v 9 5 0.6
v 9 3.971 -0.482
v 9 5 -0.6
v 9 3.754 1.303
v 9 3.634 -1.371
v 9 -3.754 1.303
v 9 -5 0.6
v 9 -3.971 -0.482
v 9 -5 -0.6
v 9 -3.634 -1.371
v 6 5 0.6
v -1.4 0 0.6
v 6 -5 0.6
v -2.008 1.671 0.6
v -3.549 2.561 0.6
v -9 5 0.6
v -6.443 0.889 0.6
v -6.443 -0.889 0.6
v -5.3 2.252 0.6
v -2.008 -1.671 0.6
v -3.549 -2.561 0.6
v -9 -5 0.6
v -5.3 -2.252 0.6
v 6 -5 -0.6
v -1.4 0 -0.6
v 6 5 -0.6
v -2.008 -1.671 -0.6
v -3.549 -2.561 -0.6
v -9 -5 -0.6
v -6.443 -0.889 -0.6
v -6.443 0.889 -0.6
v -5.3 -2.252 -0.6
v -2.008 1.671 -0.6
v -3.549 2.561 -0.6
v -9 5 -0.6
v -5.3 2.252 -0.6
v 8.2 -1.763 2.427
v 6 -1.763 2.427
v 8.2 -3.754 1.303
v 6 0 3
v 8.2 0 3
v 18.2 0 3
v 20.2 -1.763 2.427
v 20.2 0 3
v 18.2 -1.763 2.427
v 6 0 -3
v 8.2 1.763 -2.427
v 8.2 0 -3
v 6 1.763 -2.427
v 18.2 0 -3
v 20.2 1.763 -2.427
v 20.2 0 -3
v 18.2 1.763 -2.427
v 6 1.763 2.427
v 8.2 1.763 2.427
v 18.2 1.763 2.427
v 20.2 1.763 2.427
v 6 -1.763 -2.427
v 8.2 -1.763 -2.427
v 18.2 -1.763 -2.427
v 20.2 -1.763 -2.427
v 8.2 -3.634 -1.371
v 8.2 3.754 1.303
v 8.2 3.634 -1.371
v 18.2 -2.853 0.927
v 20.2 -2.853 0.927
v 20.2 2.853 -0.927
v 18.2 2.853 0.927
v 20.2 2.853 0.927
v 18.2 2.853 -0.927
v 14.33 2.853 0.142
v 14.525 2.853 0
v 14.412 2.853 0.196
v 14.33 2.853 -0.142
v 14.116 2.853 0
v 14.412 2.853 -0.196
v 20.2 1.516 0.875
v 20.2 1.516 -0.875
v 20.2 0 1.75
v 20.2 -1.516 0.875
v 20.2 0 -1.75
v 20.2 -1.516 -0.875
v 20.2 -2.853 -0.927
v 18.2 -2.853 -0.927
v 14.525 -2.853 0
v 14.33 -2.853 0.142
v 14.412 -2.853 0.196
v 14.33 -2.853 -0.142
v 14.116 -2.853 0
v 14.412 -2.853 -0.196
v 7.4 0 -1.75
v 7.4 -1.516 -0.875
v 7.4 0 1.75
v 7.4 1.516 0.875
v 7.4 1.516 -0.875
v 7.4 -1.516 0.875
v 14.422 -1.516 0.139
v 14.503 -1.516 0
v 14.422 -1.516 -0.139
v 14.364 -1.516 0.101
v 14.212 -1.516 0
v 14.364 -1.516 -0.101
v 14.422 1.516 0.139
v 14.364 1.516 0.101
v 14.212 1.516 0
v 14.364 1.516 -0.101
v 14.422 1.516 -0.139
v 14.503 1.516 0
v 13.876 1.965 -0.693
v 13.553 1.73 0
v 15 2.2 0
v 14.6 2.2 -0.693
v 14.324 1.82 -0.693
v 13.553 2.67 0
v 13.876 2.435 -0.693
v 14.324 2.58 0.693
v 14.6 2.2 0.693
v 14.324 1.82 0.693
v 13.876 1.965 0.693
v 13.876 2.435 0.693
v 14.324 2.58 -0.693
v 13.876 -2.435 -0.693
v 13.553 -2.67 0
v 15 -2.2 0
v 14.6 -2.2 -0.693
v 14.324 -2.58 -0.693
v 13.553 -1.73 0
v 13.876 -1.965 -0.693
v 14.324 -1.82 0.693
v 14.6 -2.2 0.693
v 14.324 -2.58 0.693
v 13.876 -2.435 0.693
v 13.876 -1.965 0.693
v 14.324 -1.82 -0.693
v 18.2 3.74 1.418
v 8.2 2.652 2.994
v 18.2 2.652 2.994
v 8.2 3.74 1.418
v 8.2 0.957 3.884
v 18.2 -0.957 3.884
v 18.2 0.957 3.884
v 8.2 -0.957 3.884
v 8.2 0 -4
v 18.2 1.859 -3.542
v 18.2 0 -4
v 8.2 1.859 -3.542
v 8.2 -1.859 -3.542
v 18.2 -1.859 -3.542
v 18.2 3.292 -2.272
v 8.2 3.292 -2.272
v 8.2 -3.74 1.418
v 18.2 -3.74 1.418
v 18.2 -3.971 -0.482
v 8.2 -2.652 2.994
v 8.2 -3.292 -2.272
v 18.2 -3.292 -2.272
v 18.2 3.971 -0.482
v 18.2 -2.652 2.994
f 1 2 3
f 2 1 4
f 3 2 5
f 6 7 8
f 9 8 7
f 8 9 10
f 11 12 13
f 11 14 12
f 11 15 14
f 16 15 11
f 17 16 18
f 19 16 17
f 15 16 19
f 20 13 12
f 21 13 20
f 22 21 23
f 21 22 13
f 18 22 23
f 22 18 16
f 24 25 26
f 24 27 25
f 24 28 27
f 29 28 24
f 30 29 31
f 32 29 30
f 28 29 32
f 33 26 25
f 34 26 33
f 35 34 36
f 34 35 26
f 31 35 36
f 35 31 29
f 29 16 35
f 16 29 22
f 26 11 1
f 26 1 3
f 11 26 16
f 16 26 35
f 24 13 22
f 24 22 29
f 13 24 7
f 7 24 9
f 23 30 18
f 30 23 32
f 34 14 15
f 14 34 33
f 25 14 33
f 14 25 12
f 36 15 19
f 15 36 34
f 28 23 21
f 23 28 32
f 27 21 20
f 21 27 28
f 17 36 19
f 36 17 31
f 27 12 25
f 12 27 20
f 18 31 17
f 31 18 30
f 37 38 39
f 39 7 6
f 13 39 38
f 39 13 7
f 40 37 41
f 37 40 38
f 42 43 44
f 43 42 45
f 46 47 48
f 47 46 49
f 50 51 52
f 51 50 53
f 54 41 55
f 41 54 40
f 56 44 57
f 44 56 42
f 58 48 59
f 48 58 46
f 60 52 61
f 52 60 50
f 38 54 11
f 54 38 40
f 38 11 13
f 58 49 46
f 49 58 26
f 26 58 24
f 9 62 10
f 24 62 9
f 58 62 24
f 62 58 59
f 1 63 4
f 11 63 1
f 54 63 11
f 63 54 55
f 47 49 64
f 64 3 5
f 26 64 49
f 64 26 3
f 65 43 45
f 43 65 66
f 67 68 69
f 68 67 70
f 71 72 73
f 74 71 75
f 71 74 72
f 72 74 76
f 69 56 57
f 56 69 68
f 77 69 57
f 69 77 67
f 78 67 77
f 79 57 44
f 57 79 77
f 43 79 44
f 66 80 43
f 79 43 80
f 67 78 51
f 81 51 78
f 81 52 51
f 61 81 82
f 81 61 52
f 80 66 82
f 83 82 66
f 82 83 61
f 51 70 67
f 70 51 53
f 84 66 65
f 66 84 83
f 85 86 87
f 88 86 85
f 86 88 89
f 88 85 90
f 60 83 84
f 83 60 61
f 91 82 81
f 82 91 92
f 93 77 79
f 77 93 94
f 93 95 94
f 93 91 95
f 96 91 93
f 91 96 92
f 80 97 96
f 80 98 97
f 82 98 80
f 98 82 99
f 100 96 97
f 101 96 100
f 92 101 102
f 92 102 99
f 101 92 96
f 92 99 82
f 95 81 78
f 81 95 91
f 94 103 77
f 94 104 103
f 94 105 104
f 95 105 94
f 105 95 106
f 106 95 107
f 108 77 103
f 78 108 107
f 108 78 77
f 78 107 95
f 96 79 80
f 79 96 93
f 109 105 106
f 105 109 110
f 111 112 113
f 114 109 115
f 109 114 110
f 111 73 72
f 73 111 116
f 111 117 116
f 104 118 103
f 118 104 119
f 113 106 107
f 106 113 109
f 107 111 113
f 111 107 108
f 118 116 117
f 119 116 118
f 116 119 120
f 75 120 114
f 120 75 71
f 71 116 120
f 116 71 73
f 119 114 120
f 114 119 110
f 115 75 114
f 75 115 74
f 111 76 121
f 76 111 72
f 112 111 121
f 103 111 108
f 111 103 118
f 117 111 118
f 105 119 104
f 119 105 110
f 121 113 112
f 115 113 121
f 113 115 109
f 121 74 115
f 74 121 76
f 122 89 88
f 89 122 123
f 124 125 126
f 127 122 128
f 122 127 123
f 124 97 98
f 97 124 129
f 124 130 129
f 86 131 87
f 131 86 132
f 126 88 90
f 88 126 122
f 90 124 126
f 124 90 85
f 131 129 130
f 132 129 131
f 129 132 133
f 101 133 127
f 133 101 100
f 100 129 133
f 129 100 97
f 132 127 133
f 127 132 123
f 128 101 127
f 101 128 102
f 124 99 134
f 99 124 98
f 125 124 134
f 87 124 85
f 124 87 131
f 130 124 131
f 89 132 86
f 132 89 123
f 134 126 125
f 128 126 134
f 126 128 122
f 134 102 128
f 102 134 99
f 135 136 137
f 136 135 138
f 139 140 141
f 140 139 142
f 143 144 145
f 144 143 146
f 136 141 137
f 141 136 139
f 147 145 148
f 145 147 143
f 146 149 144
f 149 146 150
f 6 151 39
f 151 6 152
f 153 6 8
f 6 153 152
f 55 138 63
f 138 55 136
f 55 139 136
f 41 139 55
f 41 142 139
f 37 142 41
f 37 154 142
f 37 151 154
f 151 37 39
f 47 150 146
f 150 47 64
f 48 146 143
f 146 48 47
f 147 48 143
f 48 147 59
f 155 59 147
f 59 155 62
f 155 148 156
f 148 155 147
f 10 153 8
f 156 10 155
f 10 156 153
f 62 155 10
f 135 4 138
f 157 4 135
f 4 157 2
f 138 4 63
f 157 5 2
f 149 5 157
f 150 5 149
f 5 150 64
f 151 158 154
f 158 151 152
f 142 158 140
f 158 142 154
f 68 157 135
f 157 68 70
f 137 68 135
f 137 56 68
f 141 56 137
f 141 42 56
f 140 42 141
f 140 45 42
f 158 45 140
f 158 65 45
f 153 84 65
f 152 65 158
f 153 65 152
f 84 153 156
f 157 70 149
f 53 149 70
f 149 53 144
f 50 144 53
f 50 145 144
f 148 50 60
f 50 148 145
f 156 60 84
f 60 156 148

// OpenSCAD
// Parameters
tongue_L = 18; //[9:36:1]
tongue_W = 10; //[5:20:1]
tongue_T = 1.2; //[0.6:2.4:0.1]
ring_OD = 10; //[6:20:0.5]
ring_ID = 5.2; //[3:10:0.1]
barrel_L = 12; //[6:24:1]
barrel_OD = 6; //[3:12:0.5]
barrel_ID = 3.5; //[1.5:8:0.1]
transition_L = 3; //[1.5:6:0.5]
overlap = 0.8; //[0.3:2:0.1]
sleeve_L = 10; //[0:25:1]
sleeve_T = 1.0; //[0.5:2.5:0.1]
mark_d = 0.6; //[0.2:1.2:0.1]
mark_r = 0.8; //[0.4:1.6:0.1]

// Base Shapes
module tongue_plate() {
  translate([0, 0, 0])
    cube([tongue_L, tongue_W, tongue_T], center=true);
}

module ring_outer() {
  translate([-tongue_L/2 + ring_OD/2, 0, 0])
    cylinder(h=tongue_T, r=ring_OD/2, center=true);
}

module ring_hole() {
  translate([-tongue_L/2 + ring_OD/2, 0, 0])
    cylinder(h=tongue_T + 2*overlap, r=ring_ID/2, center=true);
}

module wire_barrel() {
  translate([tongue_L/2 + barrel_L/2 - overlap, 0, 0])
    rotate([0, 90, 0])
      cylinder(h=barrel_L, r=barrel_OD/2, center=true);
}

module barrel_bore() {
  translate([tongue_L/2 + barrel_L/2 - overlap, 0, 0])
    rotate([0, 90, 0])
      cylinder(h=barrel_L + 2*overlap, r=barrel_ID/2, center=true);
}

module tongue_to_barrel_transition() {
  translate([tongue_L/2 - transition_L/2, 0, 0])
    cube([transition_L, tongue_W, tongue_T], center=true);
}

module transition_rounder() {
  translate([tongue_L/2 - transition_L/2, 0, 0])
    rotate([0, 90, 0])
      cylinder(h=transition_L, r=barrel_OD/2, center=true);
}

module insulation_sleeve_outer() {
  translate([tongue_L/2 + sleeve_L/2 - overlap, 0, 0])
    rotate([0, 90, 0])
      cylinder(h=sleeve_L, r=barrel_OD/2 + sleeve_T, center=true);
}

module insulation_sleeve_inner() {
  translate([tongue_L/2 + sleeve_L/2 - overlap, 0, 0])
    rotate([0, 90, 0])
      cylinder(h=sleeve_L + 2*overlap, r=barrel_OD/2, center=true);
}

module stamp_mark_1() {
  translate([tongue_L/2 + barrel_L/2 - overlap, barrel_OD/2 - mark_r, 0])
    sphere(r=mark_r, center=true);
}

module stamp_mark_2() {
  translate([tongue_L/2 + barrel_L/2 - overlap, -(barrel_OD/2 - mark_r), 0])
    sphere(r=mark_r, center=true);
}

// Operations
module tongue_with_ring_outer_union() {
  union() {
    tongue_plate();
    ring_outer();
  }
}

module tongue_solid() {
  difference() {
    tongue_with_ring_outer_union();
    ring_hole();
  }
}

module transition_hull() {
  hull() {
    tongue_to_barrel_transition();
    transition_rounder();
  }
}

module metal_outer_union() {
  union() {
    tongue_solid();
    transition_hull();
    wire_barrel();
  }
}

module metal_hollowed() {
  difference() {
    metal_outer_union();
    barrel_bore();
  }
}

module stamping_marks() {
  difference() {
    metal_hollowed();
    stamp_mark_1();
    stamp_mark_2();
  }
}

module insulation_sleeve() {
  difference() {
    insulation_sleeve_outer();
    insulation_sleeve_inner();
  }
}

module chamfers_fillets() {
  union() {
    stamping_marks();
    insulation_sleeve();
  }
}

// Final Output
chamfers_fillets();
